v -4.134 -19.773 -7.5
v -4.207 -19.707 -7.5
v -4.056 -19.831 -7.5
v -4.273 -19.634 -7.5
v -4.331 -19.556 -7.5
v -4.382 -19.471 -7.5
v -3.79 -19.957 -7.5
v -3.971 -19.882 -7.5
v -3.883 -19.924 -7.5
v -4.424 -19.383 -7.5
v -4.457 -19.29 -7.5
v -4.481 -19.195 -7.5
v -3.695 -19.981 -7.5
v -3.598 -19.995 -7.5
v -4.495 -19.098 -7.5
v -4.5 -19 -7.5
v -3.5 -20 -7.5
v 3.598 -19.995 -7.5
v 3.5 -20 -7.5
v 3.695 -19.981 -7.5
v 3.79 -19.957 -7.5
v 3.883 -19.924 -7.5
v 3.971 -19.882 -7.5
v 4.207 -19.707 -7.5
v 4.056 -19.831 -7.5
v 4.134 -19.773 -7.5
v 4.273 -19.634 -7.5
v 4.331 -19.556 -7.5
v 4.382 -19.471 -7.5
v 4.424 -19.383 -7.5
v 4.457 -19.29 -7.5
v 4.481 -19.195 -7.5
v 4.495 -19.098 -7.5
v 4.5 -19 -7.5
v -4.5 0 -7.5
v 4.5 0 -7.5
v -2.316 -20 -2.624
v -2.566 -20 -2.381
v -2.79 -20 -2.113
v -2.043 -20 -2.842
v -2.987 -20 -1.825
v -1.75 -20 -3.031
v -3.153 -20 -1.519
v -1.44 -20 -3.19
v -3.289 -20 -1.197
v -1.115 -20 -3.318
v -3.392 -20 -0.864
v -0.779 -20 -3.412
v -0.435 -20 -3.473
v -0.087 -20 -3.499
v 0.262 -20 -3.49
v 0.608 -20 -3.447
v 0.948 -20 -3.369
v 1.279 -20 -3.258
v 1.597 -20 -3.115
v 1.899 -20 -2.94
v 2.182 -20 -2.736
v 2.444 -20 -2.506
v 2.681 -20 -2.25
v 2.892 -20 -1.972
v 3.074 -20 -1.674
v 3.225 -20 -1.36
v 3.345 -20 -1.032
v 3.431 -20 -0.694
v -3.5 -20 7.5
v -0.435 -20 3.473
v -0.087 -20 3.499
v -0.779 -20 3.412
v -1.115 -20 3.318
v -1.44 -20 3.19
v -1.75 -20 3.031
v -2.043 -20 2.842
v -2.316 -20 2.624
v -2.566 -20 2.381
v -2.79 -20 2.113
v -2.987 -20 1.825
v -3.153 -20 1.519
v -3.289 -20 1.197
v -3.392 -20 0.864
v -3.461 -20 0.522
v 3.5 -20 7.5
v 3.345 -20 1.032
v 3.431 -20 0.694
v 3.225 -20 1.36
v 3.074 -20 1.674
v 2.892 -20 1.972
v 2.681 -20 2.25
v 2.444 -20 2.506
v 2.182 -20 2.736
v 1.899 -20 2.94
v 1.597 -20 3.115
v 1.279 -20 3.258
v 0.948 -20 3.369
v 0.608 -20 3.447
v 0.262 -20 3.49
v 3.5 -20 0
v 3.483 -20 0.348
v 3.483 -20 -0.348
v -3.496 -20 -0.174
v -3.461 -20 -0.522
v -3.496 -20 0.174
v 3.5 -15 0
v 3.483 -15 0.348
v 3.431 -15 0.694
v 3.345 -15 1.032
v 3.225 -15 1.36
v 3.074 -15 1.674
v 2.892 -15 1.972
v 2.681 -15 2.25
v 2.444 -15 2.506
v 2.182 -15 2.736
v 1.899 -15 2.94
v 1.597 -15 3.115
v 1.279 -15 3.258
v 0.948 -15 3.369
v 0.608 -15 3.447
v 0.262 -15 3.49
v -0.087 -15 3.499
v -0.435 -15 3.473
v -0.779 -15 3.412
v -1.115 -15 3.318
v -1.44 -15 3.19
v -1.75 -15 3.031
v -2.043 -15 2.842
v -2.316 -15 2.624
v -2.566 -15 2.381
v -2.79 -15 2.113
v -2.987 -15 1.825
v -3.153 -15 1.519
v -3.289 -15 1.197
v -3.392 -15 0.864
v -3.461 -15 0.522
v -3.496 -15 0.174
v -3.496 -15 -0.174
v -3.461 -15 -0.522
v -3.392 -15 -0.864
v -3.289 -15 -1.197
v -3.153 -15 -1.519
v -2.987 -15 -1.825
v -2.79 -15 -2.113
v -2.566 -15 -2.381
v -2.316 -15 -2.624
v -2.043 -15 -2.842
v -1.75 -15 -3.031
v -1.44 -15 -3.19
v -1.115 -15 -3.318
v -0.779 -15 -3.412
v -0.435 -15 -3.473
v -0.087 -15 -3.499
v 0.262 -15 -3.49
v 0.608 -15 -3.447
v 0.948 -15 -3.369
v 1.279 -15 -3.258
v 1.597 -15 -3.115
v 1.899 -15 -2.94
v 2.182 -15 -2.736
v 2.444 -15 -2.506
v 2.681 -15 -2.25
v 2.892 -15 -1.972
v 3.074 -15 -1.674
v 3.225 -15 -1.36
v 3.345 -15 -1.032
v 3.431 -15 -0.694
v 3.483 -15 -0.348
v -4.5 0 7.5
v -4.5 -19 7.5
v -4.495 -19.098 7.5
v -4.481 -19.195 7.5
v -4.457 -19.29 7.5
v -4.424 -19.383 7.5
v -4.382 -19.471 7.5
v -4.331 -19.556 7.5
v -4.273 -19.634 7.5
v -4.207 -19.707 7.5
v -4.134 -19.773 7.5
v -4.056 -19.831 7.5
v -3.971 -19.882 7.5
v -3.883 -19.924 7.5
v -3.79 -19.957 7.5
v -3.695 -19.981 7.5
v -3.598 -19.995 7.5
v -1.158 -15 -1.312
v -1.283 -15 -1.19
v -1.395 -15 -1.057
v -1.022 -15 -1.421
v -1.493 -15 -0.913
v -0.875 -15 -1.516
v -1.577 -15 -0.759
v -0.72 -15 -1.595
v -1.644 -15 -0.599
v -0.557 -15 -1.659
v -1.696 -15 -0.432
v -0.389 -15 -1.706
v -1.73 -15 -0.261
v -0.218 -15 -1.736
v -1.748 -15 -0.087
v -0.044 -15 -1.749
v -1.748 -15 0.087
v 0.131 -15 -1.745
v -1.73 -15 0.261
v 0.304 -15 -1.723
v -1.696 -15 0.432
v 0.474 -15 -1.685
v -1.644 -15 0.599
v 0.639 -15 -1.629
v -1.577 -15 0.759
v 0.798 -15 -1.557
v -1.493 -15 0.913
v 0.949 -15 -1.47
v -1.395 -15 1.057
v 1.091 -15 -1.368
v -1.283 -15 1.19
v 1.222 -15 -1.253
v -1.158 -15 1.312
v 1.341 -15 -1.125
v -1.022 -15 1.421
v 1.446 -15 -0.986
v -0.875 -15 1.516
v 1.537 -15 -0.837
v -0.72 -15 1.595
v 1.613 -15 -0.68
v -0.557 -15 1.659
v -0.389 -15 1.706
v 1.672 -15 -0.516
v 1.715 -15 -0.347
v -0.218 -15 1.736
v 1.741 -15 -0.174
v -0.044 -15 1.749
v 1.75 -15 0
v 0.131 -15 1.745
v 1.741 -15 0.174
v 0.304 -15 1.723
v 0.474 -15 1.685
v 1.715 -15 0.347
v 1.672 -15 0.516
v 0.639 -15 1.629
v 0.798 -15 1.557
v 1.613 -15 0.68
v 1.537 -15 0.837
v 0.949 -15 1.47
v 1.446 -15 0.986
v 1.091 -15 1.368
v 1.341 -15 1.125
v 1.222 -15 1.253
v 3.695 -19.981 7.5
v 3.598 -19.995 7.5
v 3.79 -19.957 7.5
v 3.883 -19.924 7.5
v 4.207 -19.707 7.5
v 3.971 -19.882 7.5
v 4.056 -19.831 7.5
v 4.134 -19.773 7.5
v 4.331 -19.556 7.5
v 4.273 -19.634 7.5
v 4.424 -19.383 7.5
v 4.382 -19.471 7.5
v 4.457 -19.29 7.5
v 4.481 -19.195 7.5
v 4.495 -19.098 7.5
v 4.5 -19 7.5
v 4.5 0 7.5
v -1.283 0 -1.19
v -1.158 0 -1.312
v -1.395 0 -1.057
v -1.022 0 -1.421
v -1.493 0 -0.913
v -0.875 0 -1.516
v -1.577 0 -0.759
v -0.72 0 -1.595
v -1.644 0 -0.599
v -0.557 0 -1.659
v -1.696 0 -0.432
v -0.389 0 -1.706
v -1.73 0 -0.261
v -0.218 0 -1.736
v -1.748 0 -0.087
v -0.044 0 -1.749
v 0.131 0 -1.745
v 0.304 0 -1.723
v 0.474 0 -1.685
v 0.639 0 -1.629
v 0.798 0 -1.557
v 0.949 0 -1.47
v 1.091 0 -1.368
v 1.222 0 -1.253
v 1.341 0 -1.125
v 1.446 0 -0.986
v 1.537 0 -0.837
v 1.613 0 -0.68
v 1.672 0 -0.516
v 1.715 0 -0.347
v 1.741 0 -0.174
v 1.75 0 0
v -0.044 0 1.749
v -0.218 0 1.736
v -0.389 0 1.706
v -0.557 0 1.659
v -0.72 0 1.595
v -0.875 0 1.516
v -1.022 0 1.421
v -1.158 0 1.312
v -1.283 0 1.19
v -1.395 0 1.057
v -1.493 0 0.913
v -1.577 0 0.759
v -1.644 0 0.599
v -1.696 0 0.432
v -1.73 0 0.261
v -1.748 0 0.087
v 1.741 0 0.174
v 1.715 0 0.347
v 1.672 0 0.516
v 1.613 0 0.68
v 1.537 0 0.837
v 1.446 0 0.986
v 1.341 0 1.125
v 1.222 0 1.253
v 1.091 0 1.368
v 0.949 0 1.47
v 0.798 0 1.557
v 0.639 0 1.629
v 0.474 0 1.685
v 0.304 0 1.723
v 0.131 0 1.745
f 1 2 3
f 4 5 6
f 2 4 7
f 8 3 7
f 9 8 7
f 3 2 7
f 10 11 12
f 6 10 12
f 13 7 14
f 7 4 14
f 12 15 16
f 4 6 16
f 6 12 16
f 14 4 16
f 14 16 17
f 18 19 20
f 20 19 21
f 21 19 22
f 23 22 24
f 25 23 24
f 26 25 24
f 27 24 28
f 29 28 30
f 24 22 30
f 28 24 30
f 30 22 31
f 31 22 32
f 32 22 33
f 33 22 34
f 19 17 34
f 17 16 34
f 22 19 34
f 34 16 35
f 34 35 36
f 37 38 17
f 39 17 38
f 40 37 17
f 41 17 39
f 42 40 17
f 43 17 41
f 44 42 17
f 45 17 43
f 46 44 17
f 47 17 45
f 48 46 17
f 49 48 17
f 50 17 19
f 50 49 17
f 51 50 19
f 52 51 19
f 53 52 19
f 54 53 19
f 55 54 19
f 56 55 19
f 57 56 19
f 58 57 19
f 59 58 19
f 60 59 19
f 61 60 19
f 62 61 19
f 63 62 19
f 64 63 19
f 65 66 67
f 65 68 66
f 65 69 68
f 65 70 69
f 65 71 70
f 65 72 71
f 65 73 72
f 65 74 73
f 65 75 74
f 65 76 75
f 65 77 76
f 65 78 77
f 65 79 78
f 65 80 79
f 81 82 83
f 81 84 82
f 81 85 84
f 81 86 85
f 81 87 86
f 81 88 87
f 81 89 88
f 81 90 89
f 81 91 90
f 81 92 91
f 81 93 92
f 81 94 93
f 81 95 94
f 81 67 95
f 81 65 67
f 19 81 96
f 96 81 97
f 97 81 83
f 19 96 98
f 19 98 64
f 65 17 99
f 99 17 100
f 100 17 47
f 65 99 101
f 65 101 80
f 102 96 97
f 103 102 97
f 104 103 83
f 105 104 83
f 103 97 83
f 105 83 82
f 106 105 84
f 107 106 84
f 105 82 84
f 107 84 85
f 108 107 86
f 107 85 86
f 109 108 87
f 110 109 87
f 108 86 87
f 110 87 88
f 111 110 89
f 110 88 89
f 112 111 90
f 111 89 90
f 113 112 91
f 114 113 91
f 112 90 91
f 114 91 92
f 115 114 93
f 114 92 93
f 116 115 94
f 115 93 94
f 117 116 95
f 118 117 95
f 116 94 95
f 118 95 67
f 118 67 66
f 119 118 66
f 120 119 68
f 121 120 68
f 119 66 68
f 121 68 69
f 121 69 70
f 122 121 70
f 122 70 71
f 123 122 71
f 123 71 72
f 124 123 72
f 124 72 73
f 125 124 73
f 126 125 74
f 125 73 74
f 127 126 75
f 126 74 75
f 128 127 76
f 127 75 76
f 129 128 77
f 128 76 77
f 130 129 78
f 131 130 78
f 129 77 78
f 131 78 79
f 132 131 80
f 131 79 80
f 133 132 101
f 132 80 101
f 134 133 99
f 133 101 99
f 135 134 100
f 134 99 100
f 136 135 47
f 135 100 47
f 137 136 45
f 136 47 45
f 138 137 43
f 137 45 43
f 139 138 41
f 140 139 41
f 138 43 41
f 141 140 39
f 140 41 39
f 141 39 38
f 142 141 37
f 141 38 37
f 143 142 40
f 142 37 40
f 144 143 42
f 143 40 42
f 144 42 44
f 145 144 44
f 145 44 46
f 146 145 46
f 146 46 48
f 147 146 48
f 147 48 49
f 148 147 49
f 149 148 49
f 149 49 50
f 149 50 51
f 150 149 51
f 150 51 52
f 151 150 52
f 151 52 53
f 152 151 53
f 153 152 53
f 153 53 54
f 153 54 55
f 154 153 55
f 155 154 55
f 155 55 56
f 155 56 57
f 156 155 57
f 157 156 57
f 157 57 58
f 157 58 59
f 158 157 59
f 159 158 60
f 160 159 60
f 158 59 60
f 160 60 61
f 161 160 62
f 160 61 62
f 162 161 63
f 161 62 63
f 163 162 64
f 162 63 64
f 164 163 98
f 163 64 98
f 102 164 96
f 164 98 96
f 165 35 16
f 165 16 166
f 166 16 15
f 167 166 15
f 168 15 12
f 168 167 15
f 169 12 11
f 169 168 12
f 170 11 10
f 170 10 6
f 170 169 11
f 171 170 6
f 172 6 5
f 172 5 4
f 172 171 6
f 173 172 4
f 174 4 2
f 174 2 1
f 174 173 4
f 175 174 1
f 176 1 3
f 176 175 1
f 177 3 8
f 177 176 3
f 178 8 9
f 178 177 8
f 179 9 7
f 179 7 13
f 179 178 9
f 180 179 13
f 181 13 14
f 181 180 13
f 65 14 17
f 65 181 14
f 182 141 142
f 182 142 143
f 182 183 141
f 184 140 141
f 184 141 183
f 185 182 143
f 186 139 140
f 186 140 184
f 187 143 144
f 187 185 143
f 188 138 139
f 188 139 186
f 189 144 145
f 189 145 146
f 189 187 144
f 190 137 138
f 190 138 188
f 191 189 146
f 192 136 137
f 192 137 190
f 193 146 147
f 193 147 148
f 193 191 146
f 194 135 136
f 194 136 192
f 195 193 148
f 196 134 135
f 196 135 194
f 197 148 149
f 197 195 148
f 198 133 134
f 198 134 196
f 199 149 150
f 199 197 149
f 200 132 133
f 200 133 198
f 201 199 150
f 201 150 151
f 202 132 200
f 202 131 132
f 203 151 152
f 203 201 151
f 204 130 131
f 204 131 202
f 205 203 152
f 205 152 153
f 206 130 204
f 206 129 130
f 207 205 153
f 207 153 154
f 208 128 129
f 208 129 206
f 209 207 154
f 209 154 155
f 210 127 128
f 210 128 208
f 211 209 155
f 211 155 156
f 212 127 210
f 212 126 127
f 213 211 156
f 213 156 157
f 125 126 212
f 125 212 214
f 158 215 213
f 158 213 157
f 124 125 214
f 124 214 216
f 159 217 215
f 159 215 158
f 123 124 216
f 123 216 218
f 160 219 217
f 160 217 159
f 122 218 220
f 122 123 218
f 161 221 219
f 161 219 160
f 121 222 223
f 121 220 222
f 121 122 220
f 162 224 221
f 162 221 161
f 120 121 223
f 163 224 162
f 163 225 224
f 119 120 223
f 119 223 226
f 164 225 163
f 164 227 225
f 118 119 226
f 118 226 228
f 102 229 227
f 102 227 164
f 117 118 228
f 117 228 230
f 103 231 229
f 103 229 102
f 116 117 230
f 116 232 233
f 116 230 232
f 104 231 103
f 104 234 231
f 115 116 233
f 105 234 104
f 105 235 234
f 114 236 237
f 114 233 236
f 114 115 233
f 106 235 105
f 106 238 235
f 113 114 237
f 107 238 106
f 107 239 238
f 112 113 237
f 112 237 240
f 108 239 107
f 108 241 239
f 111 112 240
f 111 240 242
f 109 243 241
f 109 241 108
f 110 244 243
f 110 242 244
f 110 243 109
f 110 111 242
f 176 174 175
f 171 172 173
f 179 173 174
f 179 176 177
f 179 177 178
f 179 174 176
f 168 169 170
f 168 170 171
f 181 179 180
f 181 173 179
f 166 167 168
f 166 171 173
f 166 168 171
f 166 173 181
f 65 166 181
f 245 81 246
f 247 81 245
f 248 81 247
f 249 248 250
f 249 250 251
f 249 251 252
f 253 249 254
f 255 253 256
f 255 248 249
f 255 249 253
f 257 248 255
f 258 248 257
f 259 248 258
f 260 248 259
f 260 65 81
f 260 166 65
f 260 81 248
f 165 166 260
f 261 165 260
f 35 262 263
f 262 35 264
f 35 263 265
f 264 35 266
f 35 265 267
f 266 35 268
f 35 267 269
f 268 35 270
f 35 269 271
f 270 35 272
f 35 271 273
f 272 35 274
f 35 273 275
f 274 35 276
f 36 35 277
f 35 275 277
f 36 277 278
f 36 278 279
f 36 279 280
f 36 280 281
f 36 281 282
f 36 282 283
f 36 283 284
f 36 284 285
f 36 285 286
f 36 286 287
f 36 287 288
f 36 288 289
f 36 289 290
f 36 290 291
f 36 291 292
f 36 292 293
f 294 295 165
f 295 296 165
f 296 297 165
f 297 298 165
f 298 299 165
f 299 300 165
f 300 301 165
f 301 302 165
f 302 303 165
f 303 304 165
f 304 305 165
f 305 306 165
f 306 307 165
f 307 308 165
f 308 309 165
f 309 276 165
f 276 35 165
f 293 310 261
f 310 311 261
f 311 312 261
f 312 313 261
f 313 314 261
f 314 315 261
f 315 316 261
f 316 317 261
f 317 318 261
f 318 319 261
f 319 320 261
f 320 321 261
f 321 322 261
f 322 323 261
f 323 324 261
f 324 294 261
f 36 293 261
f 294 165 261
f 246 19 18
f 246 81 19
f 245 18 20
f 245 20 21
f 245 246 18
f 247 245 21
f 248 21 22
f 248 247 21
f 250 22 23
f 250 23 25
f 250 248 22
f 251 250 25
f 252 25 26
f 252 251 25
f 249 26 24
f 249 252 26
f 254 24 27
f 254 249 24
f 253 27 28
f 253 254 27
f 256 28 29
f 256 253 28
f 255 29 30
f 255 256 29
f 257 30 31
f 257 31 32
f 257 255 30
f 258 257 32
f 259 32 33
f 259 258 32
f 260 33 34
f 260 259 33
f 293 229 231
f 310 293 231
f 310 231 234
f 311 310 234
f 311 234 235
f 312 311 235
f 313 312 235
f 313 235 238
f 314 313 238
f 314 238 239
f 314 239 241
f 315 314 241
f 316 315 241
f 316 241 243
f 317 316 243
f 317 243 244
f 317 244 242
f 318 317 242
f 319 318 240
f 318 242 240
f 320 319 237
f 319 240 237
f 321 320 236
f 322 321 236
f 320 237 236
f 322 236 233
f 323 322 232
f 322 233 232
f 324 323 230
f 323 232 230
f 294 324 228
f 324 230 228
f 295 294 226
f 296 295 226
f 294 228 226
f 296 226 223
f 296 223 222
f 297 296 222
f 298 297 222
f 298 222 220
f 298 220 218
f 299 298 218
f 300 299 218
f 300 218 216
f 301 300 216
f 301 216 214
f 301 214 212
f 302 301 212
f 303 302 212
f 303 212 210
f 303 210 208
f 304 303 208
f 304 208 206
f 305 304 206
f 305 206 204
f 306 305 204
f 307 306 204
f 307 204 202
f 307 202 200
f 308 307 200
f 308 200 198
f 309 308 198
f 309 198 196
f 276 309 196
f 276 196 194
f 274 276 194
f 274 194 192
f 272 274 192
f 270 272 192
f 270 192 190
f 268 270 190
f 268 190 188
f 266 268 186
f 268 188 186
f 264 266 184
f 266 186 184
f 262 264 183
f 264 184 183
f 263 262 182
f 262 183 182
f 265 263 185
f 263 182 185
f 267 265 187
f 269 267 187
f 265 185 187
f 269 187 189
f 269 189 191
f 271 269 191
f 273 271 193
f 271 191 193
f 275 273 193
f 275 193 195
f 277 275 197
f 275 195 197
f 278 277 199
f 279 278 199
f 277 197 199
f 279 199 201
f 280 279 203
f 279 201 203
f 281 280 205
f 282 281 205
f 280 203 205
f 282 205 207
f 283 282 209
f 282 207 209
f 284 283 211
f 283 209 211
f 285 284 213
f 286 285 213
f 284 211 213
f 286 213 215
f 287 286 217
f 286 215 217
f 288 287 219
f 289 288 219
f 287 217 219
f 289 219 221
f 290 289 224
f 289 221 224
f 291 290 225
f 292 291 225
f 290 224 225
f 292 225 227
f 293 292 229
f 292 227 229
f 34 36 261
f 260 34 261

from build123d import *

# Parameters (mm, degrees)
F0_W     = 9
F0_H     = 15
F1_DEPTH = 20
F2_R     = 1.75
F3_DEPTH = 20.001
F4_R     = 3.5
F5_DEPTH = 5
F6_R     = 0.99999


# Not quite as in the source:
# - a fillet or chamfer is up to 0.001 mm smaller than in the source, because OpenCascade refuses the exact size


with BuildPart() as f1:
    # F0 (on Front) → F1 (new body)
    with BuildSketch(Plane.XZ):
        Rectangle(F0_W, F0_H)
    extrude(amount=F1_DEPTH)

    # F2 (on face) → F3 (cut, through all)
    with BuildSketch(Plane.XZ.offset(20)):
        Circle(F2_R)
    extrude(amount=-F3_DEPTH, mode=Mode.SUBTRACT)

    # F4 (on face) → F5 (cut)
    with BuildSketch(Plane.XZ.offset(20)):
        Circle(F4_R)
    extrude(amount=-F5_DEPTH, mode=Mode.SUBTRACT)

    # F6 (radius 1 in the source; OpenCascade refuses exactly that, so slightly less here)
    f6_edges = [f1.edges().sort_by_distance(p)[0] for p in [
        (4.5, -20, 0),
        (-4.5, -20, 0),
    ]]
    fillet(f6_edges, radius=F6_R)


solid = f1.part
